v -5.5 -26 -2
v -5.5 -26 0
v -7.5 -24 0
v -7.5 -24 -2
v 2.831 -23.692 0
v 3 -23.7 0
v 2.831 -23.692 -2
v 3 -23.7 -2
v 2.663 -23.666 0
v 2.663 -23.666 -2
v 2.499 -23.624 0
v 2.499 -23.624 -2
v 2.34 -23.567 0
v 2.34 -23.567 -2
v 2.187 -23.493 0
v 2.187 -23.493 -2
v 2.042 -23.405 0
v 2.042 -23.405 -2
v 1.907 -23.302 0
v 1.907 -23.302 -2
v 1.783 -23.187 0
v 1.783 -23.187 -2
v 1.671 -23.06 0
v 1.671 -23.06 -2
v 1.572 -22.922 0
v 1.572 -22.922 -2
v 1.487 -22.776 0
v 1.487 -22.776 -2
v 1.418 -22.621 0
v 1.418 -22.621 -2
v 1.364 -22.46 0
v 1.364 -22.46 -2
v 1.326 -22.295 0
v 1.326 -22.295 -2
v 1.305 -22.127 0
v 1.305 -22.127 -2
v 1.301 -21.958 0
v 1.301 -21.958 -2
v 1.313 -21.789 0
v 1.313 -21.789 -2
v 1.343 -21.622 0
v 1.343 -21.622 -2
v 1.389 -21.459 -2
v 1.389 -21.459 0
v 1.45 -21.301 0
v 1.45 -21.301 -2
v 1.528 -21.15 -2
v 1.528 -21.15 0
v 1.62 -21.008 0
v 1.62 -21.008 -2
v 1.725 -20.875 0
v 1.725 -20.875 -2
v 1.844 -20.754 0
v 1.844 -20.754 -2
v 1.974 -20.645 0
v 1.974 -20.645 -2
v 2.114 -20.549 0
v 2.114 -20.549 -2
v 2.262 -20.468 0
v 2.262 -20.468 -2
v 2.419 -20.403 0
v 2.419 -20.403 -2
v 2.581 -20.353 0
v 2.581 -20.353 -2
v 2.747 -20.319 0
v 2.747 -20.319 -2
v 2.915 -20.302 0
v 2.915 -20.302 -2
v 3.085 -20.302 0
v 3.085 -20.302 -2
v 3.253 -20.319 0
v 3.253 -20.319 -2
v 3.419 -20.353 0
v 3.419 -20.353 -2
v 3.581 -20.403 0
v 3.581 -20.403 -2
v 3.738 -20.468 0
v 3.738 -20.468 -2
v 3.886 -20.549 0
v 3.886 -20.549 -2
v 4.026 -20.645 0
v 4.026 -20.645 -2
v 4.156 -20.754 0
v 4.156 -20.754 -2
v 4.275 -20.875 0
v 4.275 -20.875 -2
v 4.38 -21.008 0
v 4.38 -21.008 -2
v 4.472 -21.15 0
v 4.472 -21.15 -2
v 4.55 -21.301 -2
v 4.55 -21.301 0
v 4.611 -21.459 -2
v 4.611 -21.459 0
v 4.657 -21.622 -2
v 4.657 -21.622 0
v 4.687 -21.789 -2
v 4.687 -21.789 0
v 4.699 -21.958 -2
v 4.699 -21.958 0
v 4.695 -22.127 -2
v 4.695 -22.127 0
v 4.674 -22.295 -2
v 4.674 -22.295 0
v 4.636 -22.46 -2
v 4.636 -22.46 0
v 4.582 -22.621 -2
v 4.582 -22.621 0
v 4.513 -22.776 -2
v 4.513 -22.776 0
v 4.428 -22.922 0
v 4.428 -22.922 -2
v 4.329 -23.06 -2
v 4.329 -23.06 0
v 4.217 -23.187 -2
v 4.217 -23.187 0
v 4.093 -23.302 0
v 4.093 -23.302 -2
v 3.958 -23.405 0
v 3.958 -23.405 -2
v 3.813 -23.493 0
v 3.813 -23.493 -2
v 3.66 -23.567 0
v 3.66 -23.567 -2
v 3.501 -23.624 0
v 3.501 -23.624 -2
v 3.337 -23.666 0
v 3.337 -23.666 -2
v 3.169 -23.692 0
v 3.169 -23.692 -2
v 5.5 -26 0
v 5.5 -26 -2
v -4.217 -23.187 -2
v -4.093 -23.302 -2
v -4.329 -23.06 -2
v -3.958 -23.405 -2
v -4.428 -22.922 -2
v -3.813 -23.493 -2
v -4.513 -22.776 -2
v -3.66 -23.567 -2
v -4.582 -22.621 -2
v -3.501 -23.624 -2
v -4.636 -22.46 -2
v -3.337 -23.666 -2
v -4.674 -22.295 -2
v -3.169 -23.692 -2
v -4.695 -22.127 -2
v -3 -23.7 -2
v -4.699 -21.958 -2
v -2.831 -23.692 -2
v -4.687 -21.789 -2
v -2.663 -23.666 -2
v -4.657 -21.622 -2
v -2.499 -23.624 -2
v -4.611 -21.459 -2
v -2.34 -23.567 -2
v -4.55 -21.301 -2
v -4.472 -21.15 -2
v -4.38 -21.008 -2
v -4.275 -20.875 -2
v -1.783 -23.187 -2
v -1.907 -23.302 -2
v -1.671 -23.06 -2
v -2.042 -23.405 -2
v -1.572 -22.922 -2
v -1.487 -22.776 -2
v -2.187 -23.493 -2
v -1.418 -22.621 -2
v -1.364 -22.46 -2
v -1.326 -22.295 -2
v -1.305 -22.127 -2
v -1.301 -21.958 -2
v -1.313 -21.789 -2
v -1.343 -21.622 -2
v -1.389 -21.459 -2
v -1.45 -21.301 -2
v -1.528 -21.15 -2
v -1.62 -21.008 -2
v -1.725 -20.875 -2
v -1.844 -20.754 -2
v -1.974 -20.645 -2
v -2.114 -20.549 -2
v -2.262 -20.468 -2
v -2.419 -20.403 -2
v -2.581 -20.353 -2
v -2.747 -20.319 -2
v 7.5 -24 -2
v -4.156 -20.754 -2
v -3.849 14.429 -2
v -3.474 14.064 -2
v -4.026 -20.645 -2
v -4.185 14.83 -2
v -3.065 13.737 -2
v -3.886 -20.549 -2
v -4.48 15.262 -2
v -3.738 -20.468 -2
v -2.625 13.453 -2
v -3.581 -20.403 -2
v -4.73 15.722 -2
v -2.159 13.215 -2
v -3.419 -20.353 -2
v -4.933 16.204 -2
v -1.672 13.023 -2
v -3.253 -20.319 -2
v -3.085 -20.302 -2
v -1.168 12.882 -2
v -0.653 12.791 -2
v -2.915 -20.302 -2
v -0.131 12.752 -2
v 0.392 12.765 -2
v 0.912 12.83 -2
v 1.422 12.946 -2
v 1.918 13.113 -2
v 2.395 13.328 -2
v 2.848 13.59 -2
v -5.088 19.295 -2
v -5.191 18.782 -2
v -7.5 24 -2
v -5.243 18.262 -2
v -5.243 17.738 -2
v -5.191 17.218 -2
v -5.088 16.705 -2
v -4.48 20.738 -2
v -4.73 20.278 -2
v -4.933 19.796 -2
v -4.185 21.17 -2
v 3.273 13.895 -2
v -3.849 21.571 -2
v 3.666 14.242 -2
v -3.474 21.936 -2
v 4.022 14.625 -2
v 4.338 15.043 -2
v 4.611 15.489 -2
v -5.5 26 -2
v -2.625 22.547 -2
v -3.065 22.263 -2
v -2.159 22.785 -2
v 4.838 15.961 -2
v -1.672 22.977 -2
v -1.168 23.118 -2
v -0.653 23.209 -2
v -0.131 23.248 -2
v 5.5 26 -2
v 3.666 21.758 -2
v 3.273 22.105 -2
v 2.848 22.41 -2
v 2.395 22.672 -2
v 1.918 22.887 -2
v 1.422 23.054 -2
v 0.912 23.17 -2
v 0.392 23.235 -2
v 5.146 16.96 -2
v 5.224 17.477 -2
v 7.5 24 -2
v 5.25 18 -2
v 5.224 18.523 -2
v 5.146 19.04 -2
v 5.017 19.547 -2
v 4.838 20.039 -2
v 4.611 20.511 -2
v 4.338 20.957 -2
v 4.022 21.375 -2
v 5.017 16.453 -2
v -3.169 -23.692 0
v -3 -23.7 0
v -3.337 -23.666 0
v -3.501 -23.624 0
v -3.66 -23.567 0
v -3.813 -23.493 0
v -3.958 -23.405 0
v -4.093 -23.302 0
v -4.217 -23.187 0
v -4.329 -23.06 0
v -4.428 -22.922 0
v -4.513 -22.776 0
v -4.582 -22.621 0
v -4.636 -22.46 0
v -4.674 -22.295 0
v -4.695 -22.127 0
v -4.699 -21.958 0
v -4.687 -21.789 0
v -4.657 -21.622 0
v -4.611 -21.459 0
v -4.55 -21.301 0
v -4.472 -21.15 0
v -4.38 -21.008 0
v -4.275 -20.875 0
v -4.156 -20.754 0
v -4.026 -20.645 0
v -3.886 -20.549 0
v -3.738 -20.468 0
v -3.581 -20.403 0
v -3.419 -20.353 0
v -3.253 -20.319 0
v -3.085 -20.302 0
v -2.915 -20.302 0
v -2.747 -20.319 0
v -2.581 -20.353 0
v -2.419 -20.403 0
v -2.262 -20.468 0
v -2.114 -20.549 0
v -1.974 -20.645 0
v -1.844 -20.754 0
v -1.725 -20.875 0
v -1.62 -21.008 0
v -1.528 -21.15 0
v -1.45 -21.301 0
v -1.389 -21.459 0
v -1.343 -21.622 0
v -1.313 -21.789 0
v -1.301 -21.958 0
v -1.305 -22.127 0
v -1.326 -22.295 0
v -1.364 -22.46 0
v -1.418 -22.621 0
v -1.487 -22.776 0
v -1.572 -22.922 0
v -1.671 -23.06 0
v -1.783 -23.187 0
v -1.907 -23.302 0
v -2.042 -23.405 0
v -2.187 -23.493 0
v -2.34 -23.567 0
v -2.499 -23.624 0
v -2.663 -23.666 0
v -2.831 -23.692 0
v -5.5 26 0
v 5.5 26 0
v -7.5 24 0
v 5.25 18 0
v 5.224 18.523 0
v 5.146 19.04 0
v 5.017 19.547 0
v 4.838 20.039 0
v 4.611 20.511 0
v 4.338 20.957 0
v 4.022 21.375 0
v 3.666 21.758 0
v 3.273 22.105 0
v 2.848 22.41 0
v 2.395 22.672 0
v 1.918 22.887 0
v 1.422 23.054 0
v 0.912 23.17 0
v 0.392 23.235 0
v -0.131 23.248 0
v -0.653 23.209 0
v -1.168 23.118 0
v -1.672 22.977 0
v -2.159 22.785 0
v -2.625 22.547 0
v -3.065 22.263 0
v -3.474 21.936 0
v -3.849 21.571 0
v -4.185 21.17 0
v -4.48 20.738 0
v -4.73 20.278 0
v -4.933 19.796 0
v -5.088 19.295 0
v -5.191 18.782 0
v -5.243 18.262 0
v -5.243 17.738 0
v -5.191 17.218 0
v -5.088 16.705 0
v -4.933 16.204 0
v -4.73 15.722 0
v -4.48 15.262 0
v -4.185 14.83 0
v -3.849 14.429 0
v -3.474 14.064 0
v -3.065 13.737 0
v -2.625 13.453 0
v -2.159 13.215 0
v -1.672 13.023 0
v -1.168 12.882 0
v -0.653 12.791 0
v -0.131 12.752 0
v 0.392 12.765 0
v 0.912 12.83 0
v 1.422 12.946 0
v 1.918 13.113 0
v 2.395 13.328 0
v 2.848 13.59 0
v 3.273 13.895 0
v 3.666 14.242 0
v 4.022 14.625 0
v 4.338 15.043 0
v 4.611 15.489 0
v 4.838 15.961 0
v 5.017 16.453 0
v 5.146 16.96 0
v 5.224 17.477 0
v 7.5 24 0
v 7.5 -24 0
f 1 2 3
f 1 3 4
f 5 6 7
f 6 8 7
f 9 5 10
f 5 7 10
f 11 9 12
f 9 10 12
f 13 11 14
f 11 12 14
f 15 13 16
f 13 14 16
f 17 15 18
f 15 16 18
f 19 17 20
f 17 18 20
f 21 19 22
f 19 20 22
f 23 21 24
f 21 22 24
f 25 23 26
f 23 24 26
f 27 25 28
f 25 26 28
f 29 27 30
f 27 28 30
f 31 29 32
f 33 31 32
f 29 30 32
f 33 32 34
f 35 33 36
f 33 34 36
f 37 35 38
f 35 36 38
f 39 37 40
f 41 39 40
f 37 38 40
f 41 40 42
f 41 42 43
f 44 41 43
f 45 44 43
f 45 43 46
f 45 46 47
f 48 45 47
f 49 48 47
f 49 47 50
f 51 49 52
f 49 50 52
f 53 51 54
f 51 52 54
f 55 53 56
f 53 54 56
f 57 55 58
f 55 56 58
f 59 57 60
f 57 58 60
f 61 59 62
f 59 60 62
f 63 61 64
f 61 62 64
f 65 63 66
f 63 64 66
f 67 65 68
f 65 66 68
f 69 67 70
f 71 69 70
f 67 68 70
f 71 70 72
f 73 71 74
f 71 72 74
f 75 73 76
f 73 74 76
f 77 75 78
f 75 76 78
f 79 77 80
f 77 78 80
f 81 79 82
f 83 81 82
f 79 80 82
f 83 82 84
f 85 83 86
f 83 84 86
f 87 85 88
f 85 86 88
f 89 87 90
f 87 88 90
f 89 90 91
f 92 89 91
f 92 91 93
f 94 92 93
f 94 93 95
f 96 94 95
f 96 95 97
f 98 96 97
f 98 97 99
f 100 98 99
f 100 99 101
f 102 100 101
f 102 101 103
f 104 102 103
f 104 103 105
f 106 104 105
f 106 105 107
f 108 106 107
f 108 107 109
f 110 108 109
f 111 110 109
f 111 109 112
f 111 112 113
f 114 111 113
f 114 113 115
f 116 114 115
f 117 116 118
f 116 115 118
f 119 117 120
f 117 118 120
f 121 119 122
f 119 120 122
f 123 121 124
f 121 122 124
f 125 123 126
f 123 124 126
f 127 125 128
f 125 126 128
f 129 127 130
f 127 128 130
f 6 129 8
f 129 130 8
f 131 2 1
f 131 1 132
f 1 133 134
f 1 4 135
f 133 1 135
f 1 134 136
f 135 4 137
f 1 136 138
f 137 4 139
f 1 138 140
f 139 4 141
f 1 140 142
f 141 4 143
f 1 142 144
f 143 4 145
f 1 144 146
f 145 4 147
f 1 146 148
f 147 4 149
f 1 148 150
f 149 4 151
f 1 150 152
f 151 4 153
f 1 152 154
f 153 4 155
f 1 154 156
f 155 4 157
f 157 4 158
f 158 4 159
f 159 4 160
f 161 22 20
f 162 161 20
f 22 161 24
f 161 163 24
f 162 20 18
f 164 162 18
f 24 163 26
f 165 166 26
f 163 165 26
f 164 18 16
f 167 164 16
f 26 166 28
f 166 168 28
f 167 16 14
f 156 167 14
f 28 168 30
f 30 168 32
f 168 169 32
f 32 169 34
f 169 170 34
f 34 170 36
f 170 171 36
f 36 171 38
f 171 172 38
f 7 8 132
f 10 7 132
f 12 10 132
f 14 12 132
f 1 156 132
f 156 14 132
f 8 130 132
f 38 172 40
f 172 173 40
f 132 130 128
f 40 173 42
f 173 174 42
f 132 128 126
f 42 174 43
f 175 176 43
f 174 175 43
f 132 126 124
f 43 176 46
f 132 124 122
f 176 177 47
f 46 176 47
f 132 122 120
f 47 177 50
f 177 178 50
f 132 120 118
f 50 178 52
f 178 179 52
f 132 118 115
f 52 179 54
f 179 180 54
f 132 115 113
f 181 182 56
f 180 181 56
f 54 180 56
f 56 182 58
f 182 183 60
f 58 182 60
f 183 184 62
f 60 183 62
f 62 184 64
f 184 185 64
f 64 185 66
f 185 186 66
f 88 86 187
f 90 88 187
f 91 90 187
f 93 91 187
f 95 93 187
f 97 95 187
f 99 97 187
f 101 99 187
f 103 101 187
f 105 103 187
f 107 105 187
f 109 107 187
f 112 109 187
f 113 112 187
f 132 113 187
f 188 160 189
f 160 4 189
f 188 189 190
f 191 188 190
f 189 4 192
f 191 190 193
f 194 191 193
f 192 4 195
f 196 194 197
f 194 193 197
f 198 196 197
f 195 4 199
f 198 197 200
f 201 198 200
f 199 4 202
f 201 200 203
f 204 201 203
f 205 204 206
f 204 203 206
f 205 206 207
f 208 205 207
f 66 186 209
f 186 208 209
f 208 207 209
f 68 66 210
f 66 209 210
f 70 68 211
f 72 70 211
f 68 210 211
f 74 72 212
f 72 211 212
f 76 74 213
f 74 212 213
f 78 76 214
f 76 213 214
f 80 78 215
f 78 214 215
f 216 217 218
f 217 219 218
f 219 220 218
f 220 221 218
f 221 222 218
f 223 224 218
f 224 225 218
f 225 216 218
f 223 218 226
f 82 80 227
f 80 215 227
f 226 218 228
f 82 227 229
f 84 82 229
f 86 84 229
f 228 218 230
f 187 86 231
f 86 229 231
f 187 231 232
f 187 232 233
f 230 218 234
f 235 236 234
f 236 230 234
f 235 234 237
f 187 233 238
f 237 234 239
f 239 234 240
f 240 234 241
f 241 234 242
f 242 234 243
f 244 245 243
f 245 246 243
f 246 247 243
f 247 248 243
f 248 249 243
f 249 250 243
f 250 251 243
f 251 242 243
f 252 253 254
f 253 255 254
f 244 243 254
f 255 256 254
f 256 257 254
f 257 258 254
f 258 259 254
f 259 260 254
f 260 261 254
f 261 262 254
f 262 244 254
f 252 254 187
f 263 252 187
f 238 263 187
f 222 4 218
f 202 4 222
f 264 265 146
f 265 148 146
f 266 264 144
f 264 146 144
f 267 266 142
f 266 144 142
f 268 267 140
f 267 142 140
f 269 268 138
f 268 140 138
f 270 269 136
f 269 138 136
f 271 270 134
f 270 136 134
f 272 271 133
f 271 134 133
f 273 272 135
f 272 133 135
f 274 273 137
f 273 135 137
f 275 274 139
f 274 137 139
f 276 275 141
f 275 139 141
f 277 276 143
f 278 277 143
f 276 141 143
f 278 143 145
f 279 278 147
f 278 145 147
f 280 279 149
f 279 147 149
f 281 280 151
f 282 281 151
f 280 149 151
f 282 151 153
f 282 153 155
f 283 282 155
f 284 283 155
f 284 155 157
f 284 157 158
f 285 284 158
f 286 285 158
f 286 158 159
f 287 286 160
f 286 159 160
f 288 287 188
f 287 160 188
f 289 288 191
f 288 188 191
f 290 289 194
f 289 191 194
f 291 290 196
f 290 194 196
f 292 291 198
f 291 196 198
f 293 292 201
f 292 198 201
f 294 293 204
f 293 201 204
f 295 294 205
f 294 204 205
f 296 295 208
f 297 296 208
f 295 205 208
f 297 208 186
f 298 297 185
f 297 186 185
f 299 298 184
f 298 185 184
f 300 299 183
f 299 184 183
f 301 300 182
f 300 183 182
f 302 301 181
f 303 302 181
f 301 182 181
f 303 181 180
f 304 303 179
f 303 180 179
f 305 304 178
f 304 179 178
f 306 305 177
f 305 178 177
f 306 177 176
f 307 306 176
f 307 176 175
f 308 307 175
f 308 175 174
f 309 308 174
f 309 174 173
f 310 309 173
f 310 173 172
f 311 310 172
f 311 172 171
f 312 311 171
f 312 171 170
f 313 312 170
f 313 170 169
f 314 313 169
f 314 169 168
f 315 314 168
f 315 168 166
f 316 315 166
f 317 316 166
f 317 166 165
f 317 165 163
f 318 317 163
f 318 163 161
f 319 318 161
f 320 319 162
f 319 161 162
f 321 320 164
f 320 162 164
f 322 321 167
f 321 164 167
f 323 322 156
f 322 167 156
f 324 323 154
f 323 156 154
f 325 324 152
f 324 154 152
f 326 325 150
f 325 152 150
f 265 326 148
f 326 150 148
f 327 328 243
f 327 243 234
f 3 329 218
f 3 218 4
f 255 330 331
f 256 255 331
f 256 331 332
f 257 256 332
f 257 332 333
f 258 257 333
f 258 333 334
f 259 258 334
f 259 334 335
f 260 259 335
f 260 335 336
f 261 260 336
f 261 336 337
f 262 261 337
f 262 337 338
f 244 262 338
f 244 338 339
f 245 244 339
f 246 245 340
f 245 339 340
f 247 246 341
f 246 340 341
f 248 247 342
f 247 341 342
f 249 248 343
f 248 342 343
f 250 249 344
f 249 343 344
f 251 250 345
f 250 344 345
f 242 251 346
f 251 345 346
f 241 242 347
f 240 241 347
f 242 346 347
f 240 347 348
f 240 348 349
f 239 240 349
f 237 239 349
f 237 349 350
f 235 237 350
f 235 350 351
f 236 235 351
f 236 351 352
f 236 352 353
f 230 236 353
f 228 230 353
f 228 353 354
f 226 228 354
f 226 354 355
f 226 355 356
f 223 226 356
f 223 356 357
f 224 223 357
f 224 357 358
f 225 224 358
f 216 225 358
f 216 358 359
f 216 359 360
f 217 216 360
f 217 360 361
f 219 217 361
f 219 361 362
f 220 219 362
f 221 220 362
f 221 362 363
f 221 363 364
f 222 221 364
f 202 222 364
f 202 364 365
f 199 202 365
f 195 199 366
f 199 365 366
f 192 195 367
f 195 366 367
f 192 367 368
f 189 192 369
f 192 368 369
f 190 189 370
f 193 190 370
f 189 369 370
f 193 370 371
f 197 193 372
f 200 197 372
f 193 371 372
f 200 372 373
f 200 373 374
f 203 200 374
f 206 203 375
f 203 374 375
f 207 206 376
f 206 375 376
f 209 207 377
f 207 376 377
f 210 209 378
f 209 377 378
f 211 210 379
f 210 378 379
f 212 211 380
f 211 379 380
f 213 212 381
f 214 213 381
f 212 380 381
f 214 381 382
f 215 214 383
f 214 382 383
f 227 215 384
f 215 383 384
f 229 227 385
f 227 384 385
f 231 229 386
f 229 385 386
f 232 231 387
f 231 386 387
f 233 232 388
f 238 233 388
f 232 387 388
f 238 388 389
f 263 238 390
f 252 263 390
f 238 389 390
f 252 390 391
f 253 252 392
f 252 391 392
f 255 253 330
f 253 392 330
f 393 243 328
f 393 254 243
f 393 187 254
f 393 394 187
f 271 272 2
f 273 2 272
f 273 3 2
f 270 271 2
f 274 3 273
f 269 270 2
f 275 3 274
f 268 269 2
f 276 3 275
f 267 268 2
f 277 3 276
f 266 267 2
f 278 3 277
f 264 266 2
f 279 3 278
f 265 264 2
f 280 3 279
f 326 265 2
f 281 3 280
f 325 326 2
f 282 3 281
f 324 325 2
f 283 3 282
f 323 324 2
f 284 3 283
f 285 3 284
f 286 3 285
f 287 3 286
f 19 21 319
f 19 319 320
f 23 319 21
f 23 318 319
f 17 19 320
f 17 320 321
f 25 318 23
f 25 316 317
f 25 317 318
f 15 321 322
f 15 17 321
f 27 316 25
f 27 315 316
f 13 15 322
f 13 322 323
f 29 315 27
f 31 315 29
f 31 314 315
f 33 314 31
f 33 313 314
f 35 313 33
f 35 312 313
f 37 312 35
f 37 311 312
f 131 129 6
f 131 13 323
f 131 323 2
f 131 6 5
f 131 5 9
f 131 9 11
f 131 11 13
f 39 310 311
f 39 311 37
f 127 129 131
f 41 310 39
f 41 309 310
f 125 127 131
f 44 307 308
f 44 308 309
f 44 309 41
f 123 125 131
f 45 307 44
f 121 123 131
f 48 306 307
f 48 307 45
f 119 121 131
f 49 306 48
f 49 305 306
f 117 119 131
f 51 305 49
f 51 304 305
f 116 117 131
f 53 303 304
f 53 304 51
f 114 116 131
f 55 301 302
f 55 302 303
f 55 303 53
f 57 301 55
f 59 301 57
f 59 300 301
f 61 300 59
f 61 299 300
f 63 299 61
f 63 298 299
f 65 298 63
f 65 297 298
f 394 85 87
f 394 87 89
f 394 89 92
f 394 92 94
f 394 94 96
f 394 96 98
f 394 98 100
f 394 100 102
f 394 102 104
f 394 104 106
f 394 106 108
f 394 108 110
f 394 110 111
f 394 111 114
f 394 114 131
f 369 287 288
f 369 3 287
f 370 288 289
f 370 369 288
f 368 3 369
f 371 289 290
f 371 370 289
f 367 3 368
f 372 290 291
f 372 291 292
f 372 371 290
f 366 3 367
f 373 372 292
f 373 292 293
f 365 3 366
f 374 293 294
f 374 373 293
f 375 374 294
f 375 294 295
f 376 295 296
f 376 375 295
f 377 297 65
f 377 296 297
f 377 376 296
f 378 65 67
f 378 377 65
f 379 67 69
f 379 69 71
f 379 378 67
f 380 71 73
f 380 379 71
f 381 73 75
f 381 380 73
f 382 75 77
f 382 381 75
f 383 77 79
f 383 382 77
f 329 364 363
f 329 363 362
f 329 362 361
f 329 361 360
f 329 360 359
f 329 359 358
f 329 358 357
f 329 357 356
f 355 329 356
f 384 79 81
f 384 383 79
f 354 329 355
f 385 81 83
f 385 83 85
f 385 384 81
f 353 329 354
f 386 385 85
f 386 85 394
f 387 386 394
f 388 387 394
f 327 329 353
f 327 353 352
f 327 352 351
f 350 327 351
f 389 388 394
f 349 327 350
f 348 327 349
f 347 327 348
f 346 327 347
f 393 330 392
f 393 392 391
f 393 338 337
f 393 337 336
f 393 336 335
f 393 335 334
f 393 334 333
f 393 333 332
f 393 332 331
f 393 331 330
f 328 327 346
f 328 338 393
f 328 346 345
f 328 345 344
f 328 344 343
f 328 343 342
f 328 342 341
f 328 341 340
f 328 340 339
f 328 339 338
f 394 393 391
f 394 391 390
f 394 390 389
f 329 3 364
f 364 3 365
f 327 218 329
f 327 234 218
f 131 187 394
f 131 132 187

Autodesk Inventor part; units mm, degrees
ref_plane "YZ Plane" through (0, 0, 0) normal (1, 0, 0) x (0, 1, 0)
ref_plane "XZ Plane" through (0, 0, 0) normal (0, 1, 0) x (-1, 0, 0)
ref_plane "XY Plane" through (0, 0, 0) normal (0, 0, 1) x (1, 0, 0)
sketch "Sketch1" plane through (0, 0, 0) normal (0, 0, 1) x (1, 0, 0)
  line L0 (-7.5, -26) -> (7.5, -26)
  line L1 (7.5, -26) -> (7.5, 26)
  line L2 (7.5, 26) -> (-7.5, 26)
  line L3 (-7.5, 26) -> (-7.5, -26)
  line L4 (-7.5, -26) -> (7.5, 26) construction
  line L5 (7.5, -26) -> (-7.5, 26) construction
  line L6 (0, 26) -> (0, 18)
  circle A0 centre (0, 18) radius 5.25
  line L7 (0, -26) -> (0, -22)
  line L8 (-3, -22) -> (3, -22)
  circle A1 centre (-3, -22) radius 1.5
  circle A2 centre (3, -22) radius 1.5
  point P0 (0, 0)
  dimension "d0" = 15
  dimension "d1" = 52
  dimension "d2" = 8
  dimension "d3" = 10.5
  dimension "d6" = 4
  dimension "d7" = 6
  dimension "d8" = 3
  dimension "d9" = 3
extrude "Extrusion1" add sketch "Sketch1" against normal blind 2
chamfer "Chamfer1" distance 2 angle 45 4 edges at (7.5, 26, -1) (-7.5, 26, -1) (7.5, -26, -1) (-7.5, -26, -1)
hole "Hole1" at (-3, -22, 0) at (3, -22, 0) direction (0, 0, -1) diameter 3.4 end through all clearance for "Flat Head Machine Screw" size "M3" standard "Ansi Metric M Profile"
properties part number "Loadcell_lever"
